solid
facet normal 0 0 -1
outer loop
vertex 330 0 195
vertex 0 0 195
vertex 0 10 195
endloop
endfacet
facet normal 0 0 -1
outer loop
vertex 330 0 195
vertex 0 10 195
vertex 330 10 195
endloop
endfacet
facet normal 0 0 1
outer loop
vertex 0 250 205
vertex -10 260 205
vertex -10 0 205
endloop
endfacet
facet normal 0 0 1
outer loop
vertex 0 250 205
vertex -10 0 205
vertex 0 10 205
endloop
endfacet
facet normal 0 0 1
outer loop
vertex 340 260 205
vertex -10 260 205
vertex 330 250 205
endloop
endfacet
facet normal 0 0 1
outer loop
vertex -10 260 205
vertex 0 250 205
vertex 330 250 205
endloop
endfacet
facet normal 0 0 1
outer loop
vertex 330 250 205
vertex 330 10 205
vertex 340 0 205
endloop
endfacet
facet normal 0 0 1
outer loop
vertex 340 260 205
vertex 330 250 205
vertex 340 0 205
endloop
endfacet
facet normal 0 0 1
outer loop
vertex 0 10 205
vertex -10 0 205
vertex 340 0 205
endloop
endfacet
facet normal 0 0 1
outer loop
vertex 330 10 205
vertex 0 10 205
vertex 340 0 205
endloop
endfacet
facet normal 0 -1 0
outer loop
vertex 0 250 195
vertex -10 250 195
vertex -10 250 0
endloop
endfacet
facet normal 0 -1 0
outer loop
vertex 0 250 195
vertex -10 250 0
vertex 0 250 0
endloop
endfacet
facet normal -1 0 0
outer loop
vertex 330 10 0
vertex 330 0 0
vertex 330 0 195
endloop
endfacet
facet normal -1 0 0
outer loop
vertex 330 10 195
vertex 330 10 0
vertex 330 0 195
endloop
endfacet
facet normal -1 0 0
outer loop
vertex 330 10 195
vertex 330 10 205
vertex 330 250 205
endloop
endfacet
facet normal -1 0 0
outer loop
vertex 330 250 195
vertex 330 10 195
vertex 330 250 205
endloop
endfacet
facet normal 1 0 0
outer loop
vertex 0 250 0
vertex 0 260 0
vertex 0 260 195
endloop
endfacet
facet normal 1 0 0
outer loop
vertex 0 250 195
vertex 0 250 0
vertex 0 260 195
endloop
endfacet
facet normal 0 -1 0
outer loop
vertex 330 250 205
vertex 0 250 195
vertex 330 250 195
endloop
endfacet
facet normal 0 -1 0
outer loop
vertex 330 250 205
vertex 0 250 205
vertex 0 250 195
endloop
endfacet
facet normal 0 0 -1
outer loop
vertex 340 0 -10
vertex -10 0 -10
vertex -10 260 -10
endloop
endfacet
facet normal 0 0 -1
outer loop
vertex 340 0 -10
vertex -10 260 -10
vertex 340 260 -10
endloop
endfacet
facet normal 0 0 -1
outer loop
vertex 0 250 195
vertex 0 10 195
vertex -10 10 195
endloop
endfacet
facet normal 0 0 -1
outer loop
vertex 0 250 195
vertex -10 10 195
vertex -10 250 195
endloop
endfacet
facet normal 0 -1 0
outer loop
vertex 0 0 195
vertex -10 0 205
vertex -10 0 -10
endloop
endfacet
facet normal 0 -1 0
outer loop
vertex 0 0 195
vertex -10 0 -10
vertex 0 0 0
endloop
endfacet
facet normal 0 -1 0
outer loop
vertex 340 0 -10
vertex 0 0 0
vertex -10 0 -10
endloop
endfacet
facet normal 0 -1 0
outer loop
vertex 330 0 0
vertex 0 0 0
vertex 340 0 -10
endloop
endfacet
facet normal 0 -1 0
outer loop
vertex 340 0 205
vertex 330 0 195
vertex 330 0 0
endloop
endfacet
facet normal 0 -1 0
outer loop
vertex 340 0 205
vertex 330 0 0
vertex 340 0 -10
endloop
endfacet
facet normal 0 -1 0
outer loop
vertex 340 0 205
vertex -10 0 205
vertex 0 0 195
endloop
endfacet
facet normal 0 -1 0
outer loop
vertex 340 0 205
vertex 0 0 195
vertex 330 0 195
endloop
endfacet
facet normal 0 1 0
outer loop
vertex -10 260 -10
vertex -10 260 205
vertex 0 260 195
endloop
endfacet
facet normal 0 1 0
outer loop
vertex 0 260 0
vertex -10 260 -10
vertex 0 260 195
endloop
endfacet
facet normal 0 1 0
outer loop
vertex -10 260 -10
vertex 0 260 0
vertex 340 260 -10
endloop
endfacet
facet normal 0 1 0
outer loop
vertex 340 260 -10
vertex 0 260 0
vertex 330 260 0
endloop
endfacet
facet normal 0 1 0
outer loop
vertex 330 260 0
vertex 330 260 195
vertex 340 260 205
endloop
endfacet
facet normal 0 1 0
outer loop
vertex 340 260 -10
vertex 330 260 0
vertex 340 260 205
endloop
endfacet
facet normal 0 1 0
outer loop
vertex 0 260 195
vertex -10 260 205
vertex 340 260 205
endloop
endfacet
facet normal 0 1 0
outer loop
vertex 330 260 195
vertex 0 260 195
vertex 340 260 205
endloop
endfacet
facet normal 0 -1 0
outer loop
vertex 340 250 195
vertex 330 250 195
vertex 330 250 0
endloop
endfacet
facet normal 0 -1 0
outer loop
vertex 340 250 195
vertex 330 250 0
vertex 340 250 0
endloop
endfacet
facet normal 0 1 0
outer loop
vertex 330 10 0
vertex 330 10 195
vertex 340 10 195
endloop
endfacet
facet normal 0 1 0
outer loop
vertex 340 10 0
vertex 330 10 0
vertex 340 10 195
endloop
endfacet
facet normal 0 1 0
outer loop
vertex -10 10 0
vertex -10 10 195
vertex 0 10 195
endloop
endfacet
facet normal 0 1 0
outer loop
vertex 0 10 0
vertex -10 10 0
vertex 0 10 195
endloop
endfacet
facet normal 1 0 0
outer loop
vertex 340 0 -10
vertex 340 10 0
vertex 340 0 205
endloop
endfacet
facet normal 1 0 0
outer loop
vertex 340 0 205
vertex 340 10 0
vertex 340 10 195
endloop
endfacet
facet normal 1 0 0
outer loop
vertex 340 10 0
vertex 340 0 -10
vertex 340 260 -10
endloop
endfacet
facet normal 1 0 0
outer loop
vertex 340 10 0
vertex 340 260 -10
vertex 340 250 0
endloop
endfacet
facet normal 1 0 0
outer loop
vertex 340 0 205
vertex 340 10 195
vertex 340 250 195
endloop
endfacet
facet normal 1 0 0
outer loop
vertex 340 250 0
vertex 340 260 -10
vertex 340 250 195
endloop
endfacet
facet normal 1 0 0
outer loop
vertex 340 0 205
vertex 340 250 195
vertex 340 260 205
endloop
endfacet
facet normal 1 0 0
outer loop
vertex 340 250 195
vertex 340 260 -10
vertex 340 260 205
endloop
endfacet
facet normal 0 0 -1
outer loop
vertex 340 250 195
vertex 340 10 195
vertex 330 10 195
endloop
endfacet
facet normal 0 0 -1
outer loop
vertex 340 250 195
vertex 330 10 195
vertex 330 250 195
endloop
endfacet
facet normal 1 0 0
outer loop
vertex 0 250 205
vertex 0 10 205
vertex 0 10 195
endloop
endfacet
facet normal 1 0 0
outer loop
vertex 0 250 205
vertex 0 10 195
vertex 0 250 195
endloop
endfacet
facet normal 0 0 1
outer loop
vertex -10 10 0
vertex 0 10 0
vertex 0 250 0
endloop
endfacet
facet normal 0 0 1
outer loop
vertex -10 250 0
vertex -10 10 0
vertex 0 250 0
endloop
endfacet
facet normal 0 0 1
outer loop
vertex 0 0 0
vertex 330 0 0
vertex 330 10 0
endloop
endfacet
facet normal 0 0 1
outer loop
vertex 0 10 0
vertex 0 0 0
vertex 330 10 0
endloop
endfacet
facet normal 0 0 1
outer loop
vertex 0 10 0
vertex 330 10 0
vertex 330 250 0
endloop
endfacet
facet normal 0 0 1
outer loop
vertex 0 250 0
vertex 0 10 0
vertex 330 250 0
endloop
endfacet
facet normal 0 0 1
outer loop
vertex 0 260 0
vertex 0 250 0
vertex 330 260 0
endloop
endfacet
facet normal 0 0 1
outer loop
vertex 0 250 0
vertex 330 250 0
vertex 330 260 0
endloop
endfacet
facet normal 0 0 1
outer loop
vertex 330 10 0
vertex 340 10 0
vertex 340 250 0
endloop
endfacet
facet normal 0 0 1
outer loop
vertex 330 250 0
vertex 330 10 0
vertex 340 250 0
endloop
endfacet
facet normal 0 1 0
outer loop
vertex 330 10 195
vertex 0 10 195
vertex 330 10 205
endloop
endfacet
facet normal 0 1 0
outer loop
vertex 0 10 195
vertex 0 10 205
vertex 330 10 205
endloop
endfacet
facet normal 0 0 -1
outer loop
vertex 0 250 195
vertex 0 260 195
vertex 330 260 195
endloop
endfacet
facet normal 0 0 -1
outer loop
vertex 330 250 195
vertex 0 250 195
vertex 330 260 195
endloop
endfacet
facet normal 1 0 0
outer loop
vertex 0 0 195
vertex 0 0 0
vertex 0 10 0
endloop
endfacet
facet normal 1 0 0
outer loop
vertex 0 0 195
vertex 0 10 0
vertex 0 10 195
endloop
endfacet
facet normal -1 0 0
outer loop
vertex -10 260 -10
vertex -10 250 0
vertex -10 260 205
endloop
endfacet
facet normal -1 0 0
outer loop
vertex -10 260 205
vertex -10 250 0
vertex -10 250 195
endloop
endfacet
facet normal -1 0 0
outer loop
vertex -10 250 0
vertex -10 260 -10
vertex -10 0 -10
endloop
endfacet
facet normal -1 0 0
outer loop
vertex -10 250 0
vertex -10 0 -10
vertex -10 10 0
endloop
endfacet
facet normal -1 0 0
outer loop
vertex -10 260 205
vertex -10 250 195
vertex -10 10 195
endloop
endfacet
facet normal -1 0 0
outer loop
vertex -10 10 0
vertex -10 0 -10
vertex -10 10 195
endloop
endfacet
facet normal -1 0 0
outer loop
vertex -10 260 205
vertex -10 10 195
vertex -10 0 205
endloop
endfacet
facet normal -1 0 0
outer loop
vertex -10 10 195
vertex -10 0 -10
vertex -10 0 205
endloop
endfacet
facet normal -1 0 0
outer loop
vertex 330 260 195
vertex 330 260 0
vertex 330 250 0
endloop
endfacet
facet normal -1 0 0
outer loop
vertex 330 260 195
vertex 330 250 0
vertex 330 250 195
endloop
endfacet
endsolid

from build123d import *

# Parameters (mm, degrees)
F0_W      = 350
F0_H      = 215
F0_W_2    = 330
F0_H_2    = 195
F2_DEPTH  = 10
F1_W      = 260
F1_H      = 215
F1_W_2    = 240
F1_H_2    = 195
F3_DEPTH  = 10
F4_W      = 340
F4_H      = 240
F5_DEPTH  = 10
F8_W      = 350
F8_H      = 215
F8_W_2    = 330
F8_H_2    = 195
F10_DEPTH = 10
F9_W      = 260
F9_H      = 215
F9_W_2    = 240
F9_H_2    = 195
F11_DEPTH = 10


# Not quite as in the source:
# - a pattern or mirror of a feature is missing from the dataset's text; its kind, count and spacing are read off the source's solid


with BuildPart() as f2:
    # F0 (on Front) → F2 (new body, through all)
    with BuildSketch(Plane.XZ):
        with Locations((165, 97.5)):
            Rectangle(F0_W, F0_H)
        with Locations((165, 97.5)):
            Rectangle(F0_W_2, F0_H_2, mode=Mode.SUBTRACT)
    extrude(amount=-F2_DEPTH)


with BuildPart() as f2_copies_1:
    # F2_copies: instance of F2
    add(f2.part.mirror(Plane.ZX.offset(130)))


with BuildPart() as f2_1:
    add(f2.part)

    add(f2_copies_1.part)  # F3 merges F2_copies_1
    # F1 (on Right) → F3 (join, through all)
    with BuildSketch(Plane.YZ):
        with Locations((130, 97.5)):
            Rectangle(F1_W, F1_H)
        with Locations((130, 97.5)):
            Rectangle(F1_W_2, F1_H_2, mode=Mode.SUBTRACT)
    extrude(amount=-F3_DEPTH)

    # F4 (on face) → F5 (join, through all)
    with BuildSketch(Plane(origin=(0, 0, -10), x_dir=(1, 0, 0), z_dir=(0, 0, -1))):
        Polygon((340, -10), (340, 0), (-10.0000000001, 0), (-10.0000000001, -260), (340, -260), (340, -250), (0, -250), (0, -10), align=None)
        with Locations((170, -130)):
            Rectangle(F4_W, F4_H)
    extrude(amount=-F5_DEPTH)

    # F8 (on plane+point) → F10 (join, through all)
    with BuildSketch(Plane.XZ.offset(-260)):
        with Locations((165, 97.5)):
            Rectangle(F8_W, F8_H)
        with Locations((165, 97.5)):
            Rectangle(F8_W_2, F8_H_2, mode=Mode.SUBTRACT)
    extrude(amount=F10_DEPTH)

    # F9 (on plane+point) → F11 (join, through all)
    with BuildSketch(Plane.YZ.offset(340)):
        with Locations((130, 97.5)):
            Rectangle(F9_W, F9_H)
        with Locations((130, 97.5)):
            Rectangle(F9_W_2, F9_H_2, mode=Mode.SUBTRACT)
    extrude(amount=-F11_DEPTH)


solid = f2_1.part
